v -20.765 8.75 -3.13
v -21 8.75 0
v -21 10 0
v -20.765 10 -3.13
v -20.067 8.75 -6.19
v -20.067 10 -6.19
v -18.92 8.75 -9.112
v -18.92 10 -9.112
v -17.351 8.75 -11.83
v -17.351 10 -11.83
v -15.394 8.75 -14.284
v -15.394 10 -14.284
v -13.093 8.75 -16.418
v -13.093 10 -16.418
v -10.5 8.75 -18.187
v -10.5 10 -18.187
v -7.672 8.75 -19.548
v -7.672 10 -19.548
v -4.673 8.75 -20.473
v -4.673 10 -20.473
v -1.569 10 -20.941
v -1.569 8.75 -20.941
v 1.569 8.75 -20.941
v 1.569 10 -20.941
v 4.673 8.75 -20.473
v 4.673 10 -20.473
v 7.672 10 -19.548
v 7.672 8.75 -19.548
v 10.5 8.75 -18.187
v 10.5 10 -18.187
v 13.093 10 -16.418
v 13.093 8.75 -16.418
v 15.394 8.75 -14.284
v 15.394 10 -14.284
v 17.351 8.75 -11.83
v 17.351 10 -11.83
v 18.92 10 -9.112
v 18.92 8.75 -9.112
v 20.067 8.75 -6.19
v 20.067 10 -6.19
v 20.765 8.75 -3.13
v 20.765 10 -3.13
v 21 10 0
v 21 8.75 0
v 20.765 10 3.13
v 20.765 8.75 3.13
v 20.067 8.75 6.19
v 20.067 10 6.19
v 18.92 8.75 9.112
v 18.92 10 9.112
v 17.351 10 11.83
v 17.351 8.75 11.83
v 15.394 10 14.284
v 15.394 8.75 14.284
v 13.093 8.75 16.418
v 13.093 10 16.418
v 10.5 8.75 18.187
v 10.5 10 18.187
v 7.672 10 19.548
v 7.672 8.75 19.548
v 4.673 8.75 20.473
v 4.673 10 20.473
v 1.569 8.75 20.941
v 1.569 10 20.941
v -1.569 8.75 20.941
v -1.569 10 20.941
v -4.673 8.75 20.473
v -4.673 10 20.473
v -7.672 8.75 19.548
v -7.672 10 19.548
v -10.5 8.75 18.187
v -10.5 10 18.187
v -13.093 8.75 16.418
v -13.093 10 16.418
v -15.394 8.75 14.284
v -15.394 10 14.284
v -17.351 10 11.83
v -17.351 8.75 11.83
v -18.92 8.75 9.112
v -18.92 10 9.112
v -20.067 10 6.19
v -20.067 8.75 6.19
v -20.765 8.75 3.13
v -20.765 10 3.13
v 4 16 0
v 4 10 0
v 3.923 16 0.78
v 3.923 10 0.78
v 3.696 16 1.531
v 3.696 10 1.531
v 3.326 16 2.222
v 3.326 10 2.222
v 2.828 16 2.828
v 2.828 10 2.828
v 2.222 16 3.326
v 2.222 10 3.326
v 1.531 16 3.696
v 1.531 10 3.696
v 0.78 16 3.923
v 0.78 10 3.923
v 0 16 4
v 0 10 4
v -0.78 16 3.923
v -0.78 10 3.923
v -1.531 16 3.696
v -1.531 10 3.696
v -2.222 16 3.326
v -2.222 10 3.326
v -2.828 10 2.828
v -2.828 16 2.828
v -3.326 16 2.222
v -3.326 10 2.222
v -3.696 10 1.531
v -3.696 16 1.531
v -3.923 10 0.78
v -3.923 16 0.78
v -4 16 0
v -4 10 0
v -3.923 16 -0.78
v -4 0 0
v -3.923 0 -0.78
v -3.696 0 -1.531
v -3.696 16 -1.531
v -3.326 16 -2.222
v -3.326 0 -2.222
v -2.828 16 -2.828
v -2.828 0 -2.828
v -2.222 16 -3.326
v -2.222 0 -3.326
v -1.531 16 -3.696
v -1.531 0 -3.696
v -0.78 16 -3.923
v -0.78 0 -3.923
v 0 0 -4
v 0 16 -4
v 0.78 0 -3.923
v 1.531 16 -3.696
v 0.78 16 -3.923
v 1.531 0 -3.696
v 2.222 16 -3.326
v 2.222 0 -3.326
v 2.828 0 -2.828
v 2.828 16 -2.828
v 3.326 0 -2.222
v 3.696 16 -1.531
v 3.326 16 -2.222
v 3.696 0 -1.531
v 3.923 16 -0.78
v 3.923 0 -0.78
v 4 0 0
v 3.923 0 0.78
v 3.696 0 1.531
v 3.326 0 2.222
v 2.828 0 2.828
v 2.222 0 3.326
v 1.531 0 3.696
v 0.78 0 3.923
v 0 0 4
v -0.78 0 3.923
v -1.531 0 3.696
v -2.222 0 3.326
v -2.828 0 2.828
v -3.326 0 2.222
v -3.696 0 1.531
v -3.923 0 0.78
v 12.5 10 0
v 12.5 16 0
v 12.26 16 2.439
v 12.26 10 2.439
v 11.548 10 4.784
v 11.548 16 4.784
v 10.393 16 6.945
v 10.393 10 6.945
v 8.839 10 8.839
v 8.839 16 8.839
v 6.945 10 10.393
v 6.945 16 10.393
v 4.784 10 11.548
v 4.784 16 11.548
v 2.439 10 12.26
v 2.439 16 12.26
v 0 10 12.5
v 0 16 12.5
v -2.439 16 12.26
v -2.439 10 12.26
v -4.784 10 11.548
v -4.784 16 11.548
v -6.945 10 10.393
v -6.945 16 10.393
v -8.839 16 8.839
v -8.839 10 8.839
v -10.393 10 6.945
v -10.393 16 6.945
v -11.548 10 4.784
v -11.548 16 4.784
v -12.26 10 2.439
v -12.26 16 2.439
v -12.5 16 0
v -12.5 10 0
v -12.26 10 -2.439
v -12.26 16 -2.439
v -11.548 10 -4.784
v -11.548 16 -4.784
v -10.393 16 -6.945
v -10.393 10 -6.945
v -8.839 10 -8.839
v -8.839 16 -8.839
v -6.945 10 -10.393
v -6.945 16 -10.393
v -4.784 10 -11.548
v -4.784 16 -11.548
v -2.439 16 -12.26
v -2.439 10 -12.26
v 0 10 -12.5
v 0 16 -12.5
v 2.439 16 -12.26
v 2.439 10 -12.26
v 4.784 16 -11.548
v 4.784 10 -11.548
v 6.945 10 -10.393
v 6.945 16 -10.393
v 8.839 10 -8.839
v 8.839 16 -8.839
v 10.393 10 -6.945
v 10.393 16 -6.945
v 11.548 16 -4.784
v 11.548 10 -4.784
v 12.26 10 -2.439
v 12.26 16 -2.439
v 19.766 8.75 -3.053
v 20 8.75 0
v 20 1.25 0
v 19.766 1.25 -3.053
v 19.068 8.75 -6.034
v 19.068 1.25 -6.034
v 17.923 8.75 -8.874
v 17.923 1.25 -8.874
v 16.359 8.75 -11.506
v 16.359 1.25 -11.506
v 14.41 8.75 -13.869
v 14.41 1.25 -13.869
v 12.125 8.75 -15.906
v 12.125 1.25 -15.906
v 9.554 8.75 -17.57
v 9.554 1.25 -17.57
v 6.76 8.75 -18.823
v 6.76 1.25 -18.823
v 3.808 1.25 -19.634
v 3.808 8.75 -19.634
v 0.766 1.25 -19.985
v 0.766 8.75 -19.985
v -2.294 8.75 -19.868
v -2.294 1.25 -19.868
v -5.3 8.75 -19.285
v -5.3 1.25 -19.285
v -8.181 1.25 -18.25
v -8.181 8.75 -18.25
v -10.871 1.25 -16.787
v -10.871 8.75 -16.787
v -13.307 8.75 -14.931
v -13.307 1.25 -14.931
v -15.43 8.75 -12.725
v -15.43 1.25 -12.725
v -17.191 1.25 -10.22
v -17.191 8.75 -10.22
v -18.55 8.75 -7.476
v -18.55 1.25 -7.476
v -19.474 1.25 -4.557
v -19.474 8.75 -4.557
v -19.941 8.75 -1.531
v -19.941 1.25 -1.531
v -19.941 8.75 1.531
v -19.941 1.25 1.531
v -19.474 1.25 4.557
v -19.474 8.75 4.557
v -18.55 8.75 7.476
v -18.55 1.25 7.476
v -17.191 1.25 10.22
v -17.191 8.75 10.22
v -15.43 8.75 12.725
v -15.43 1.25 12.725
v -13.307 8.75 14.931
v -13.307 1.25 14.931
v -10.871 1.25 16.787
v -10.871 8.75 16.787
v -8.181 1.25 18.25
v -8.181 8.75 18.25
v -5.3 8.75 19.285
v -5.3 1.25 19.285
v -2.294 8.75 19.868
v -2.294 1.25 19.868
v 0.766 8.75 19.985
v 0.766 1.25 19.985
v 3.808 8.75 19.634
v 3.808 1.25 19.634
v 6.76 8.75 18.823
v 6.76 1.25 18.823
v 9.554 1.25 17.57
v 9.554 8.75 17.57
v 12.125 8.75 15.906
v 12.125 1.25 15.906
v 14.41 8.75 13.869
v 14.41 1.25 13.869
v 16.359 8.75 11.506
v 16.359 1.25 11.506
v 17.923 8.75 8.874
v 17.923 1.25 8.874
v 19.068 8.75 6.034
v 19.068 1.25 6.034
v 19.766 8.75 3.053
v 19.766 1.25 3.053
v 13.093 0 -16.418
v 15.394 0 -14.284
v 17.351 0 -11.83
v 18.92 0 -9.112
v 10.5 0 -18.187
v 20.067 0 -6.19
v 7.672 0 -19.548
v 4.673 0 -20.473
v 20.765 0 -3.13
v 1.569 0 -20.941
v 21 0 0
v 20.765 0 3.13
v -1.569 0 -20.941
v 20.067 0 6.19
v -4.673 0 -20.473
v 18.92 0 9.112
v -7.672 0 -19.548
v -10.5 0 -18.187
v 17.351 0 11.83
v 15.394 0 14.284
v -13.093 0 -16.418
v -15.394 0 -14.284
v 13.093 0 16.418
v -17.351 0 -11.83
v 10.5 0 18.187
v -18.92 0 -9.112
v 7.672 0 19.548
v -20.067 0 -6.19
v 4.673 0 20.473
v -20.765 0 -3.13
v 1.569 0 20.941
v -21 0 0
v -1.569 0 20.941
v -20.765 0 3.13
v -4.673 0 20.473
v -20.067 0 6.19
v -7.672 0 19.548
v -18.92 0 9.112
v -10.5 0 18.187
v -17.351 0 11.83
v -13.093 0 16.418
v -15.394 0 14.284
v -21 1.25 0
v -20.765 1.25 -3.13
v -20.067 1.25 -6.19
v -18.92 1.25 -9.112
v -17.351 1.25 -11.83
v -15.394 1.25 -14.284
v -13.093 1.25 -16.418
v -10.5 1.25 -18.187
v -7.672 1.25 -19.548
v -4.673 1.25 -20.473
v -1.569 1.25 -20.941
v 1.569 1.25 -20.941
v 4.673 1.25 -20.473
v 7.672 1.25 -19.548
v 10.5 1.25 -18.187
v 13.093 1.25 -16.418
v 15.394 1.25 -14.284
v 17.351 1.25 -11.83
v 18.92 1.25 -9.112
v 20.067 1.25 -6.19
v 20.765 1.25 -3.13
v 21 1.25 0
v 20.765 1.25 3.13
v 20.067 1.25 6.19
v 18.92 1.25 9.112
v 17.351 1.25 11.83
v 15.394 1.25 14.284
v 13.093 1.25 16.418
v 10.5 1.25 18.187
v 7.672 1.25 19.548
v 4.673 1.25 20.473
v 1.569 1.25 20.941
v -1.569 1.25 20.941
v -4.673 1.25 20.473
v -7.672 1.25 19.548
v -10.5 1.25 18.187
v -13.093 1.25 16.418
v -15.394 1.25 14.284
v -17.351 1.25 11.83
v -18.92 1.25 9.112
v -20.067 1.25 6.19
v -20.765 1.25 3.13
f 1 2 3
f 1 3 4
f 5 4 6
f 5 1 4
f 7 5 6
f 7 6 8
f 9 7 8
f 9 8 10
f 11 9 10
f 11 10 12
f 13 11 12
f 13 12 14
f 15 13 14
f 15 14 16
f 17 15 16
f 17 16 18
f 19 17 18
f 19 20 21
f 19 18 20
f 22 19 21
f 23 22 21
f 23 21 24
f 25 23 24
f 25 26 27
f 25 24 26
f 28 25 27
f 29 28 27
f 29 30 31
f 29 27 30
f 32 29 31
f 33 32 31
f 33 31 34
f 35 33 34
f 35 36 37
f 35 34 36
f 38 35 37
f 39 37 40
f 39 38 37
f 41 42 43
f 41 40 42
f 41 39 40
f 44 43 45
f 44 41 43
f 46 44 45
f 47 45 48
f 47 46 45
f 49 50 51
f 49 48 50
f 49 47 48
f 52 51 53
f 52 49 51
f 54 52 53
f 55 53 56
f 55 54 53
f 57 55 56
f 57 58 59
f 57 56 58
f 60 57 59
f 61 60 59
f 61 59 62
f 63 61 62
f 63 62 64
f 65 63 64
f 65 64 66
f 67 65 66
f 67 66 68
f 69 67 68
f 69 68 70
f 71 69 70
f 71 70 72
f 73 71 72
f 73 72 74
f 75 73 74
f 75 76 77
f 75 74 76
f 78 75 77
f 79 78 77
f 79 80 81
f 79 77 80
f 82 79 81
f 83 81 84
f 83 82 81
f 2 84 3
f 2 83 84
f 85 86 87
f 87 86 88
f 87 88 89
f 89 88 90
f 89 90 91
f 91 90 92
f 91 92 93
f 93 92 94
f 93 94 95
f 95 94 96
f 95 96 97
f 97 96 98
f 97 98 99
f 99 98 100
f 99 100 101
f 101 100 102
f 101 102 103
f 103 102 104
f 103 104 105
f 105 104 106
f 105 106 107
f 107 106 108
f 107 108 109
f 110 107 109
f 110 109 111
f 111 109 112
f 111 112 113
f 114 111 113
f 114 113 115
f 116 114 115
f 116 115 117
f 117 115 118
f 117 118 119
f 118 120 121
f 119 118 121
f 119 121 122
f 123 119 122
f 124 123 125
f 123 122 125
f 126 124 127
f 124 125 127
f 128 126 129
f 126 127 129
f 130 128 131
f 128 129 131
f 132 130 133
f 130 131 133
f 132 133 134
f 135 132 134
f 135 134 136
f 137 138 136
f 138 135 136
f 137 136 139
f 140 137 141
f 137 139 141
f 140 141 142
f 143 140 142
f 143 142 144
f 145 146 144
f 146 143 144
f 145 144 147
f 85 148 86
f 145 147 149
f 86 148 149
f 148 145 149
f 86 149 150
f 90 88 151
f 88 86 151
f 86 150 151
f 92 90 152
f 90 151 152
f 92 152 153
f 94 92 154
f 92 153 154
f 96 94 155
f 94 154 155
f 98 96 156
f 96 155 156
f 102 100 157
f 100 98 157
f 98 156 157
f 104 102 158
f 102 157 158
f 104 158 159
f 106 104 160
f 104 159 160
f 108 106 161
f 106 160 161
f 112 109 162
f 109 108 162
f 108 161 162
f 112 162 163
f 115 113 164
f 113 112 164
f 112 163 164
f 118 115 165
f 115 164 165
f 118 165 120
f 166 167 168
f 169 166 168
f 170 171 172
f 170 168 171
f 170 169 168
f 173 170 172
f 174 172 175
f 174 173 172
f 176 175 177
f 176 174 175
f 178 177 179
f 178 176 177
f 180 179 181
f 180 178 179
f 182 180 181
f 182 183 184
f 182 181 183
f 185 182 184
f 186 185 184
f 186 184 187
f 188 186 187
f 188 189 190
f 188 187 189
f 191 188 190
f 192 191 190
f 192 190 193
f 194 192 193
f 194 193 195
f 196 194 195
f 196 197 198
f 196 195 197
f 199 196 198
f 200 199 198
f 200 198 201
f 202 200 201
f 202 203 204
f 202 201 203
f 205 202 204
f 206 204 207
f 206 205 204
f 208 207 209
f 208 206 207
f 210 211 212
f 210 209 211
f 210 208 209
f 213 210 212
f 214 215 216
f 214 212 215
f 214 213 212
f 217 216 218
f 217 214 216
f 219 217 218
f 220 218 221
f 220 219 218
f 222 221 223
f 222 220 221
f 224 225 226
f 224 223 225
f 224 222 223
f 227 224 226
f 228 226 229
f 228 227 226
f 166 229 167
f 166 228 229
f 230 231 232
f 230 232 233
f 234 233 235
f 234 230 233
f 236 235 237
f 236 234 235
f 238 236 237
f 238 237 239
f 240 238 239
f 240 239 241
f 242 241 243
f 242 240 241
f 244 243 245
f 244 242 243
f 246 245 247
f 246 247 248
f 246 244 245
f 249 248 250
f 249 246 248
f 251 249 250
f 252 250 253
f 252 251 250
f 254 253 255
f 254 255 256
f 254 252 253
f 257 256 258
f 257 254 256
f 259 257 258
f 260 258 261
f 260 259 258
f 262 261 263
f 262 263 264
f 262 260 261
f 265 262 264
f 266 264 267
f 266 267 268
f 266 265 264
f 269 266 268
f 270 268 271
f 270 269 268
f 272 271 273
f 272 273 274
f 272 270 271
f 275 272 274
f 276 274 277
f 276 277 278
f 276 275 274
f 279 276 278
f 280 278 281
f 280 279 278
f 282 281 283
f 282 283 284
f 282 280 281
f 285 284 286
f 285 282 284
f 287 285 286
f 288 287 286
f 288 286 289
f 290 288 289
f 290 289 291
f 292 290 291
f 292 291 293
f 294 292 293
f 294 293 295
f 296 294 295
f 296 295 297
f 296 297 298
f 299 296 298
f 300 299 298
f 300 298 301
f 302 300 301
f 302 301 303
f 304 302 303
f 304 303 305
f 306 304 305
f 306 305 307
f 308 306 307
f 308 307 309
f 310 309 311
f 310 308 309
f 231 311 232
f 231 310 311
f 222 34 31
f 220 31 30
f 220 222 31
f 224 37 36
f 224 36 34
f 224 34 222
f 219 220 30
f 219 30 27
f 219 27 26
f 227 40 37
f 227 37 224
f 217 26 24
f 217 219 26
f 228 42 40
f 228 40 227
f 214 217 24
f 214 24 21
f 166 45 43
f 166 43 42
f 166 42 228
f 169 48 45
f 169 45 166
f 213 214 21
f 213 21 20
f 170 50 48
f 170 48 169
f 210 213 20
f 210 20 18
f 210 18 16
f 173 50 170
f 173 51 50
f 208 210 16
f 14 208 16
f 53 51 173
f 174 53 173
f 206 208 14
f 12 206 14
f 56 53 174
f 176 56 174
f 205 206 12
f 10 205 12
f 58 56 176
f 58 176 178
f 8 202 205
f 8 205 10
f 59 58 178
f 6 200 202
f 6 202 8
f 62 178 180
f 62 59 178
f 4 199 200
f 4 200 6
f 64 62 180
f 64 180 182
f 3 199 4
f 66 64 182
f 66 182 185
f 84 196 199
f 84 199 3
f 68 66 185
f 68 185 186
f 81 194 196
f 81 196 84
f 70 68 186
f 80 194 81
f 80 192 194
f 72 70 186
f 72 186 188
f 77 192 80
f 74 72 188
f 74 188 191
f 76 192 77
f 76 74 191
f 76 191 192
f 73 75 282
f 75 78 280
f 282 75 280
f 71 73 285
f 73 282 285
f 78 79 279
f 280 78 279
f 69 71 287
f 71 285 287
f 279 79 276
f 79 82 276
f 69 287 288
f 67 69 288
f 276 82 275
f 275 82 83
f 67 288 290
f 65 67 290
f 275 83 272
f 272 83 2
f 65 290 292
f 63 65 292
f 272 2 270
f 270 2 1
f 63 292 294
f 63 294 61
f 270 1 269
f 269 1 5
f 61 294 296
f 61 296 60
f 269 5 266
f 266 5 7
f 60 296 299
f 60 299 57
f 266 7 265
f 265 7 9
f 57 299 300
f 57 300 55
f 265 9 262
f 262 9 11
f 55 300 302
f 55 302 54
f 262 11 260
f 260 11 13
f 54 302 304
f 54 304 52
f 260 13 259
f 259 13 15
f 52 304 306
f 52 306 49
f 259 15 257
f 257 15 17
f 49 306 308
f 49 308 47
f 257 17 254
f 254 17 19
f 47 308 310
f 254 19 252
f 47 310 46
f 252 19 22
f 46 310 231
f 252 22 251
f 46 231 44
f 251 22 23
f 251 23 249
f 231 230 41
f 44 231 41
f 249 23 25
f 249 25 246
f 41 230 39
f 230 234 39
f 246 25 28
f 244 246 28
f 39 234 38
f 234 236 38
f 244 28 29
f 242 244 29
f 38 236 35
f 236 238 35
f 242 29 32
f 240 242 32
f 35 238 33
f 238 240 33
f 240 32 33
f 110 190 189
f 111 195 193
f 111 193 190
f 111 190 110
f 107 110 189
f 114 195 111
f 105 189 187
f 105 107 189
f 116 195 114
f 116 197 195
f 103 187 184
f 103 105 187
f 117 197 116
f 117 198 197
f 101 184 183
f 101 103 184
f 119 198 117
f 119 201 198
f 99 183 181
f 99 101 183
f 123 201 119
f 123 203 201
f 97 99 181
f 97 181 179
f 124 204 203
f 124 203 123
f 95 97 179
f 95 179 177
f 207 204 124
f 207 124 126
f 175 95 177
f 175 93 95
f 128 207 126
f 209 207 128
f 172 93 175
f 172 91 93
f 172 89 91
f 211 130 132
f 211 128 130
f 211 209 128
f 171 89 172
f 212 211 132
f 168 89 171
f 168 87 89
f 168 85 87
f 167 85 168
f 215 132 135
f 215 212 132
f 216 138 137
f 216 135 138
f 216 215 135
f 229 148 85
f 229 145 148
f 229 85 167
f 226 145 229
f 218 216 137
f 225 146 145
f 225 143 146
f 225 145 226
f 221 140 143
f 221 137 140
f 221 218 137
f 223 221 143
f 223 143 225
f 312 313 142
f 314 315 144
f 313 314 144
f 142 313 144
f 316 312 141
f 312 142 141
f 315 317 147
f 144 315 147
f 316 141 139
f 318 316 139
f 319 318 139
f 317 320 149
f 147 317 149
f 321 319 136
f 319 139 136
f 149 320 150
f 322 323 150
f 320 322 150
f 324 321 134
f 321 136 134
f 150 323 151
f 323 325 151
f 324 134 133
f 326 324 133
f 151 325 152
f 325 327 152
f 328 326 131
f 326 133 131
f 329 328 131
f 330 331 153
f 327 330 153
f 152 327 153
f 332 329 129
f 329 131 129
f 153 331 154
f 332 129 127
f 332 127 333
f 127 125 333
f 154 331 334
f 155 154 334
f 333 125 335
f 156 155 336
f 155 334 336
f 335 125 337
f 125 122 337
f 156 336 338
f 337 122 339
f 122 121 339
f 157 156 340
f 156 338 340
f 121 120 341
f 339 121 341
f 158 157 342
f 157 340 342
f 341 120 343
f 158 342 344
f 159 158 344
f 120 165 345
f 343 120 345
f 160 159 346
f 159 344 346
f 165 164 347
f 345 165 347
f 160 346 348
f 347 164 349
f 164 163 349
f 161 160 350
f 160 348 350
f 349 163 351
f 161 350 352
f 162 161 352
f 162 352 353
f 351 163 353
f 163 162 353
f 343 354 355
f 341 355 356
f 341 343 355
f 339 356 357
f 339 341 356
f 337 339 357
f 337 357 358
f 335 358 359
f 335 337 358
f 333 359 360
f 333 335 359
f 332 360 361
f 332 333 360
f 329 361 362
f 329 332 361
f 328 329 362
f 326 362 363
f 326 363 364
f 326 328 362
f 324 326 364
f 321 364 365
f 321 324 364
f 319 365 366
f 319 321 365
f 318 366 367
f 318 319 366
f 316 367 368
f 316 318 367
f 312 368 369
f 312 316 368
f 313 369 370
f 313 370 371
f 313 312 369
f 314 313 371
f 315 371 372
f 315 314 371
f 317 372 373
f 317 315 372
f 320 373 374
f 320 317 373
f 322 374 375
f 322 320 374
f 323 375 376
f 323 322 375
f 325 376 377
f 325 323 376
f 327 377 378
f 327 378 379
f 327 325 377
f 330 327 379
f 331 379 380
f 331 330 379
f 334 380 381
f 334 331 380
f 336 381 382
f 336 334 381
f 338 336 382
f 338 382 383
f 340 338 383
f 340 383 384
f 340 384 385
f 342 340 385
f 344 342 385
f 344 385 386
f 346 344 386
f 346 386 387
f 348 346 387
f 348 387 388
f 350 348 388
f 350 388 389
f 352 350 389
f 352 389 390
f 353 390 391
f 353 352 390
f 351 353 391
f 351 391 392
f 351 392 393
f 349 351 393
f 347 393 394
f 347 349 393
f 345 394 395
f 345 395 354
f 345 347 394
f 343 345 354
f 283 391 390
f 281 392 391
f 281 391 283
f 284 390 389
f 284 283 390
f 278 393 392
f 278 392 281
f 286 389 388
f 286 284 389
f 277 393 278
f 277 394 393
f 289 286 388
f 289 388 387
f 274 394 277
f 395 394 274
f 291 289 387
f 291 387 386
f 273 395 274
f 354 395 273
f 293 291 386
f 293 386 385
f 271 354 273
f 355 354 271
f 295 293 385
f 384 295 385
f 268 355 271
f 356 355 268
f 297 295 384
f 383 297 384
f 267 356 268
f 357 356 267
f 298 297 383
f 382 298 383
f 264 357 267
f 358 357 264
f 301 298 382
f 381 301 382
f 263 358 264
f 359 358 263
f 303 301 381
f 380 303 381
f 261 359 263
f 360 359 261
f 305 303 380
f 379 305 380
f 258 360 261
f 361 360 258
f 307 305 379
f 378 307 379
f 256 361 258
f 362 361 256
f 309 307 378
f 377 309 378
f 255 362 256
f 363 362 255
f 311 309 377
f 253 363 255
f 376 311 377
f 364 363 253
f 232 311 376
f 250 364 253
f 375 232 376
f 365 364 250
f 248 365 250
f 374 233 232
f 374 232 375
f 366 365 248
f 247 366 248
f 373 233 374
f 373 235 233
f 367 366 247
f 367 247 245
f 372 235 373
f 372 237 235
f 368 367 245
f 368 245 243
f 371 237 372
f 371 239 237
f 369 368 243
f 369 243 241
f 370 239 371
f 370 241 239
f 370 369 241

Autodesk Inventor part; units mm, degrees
ref_plane "YZ Plane" through (0, 0, 0) normal (1, 0, 0) x (0, 1, 0)
ref_plane "XZ Plane" through (0, 0, 0) normal (0, 1, 0) x (-1, 0, 0)
sketch "Sketch1" plane through (0, 0, 0) normal (0, 1, 0) x (-1, 0, 0)
  circle A0 centre (0, 0) radius 21
  circle A1 centre (0, 0) radius 4
  dimension "d0" = 42
  dimension "d1" = 8
extrude "Extrusion1" add sketch "Sketch1" along normal blind 10
sketch "Sketch2" plane through (0, 10, 0) normal (0, 1, 0) x (1, 0, 0)
  circle A0 centre (0, 0) radius 4
  circle A1 centre (0, 0) radius 12.5
  dimension "d4" = 8
  dimension "d5" = 25
extrude "Extrusion2" add sketch "Sketch2" along normal blind 6
ref_plane "Work Plane1" through (0, 8.75, 0) normal (0, 1, 0) x (1, 0, 0)
sketch "Sketch3" plane through (0, 8.75, 0) normal (0, 1, 0) x (1, 0, 0)
  circle A0 centre (0, 0) radius 21
  circle A1 centre (0, 0) radius 21 projected
  circle A2 centre (0, 0) radius 20
  dimension "d9" = 1
extrude "Extrusion3" cut sketch "Sketch3" against normal blind 7.5
properties part number "Gt2_60"
